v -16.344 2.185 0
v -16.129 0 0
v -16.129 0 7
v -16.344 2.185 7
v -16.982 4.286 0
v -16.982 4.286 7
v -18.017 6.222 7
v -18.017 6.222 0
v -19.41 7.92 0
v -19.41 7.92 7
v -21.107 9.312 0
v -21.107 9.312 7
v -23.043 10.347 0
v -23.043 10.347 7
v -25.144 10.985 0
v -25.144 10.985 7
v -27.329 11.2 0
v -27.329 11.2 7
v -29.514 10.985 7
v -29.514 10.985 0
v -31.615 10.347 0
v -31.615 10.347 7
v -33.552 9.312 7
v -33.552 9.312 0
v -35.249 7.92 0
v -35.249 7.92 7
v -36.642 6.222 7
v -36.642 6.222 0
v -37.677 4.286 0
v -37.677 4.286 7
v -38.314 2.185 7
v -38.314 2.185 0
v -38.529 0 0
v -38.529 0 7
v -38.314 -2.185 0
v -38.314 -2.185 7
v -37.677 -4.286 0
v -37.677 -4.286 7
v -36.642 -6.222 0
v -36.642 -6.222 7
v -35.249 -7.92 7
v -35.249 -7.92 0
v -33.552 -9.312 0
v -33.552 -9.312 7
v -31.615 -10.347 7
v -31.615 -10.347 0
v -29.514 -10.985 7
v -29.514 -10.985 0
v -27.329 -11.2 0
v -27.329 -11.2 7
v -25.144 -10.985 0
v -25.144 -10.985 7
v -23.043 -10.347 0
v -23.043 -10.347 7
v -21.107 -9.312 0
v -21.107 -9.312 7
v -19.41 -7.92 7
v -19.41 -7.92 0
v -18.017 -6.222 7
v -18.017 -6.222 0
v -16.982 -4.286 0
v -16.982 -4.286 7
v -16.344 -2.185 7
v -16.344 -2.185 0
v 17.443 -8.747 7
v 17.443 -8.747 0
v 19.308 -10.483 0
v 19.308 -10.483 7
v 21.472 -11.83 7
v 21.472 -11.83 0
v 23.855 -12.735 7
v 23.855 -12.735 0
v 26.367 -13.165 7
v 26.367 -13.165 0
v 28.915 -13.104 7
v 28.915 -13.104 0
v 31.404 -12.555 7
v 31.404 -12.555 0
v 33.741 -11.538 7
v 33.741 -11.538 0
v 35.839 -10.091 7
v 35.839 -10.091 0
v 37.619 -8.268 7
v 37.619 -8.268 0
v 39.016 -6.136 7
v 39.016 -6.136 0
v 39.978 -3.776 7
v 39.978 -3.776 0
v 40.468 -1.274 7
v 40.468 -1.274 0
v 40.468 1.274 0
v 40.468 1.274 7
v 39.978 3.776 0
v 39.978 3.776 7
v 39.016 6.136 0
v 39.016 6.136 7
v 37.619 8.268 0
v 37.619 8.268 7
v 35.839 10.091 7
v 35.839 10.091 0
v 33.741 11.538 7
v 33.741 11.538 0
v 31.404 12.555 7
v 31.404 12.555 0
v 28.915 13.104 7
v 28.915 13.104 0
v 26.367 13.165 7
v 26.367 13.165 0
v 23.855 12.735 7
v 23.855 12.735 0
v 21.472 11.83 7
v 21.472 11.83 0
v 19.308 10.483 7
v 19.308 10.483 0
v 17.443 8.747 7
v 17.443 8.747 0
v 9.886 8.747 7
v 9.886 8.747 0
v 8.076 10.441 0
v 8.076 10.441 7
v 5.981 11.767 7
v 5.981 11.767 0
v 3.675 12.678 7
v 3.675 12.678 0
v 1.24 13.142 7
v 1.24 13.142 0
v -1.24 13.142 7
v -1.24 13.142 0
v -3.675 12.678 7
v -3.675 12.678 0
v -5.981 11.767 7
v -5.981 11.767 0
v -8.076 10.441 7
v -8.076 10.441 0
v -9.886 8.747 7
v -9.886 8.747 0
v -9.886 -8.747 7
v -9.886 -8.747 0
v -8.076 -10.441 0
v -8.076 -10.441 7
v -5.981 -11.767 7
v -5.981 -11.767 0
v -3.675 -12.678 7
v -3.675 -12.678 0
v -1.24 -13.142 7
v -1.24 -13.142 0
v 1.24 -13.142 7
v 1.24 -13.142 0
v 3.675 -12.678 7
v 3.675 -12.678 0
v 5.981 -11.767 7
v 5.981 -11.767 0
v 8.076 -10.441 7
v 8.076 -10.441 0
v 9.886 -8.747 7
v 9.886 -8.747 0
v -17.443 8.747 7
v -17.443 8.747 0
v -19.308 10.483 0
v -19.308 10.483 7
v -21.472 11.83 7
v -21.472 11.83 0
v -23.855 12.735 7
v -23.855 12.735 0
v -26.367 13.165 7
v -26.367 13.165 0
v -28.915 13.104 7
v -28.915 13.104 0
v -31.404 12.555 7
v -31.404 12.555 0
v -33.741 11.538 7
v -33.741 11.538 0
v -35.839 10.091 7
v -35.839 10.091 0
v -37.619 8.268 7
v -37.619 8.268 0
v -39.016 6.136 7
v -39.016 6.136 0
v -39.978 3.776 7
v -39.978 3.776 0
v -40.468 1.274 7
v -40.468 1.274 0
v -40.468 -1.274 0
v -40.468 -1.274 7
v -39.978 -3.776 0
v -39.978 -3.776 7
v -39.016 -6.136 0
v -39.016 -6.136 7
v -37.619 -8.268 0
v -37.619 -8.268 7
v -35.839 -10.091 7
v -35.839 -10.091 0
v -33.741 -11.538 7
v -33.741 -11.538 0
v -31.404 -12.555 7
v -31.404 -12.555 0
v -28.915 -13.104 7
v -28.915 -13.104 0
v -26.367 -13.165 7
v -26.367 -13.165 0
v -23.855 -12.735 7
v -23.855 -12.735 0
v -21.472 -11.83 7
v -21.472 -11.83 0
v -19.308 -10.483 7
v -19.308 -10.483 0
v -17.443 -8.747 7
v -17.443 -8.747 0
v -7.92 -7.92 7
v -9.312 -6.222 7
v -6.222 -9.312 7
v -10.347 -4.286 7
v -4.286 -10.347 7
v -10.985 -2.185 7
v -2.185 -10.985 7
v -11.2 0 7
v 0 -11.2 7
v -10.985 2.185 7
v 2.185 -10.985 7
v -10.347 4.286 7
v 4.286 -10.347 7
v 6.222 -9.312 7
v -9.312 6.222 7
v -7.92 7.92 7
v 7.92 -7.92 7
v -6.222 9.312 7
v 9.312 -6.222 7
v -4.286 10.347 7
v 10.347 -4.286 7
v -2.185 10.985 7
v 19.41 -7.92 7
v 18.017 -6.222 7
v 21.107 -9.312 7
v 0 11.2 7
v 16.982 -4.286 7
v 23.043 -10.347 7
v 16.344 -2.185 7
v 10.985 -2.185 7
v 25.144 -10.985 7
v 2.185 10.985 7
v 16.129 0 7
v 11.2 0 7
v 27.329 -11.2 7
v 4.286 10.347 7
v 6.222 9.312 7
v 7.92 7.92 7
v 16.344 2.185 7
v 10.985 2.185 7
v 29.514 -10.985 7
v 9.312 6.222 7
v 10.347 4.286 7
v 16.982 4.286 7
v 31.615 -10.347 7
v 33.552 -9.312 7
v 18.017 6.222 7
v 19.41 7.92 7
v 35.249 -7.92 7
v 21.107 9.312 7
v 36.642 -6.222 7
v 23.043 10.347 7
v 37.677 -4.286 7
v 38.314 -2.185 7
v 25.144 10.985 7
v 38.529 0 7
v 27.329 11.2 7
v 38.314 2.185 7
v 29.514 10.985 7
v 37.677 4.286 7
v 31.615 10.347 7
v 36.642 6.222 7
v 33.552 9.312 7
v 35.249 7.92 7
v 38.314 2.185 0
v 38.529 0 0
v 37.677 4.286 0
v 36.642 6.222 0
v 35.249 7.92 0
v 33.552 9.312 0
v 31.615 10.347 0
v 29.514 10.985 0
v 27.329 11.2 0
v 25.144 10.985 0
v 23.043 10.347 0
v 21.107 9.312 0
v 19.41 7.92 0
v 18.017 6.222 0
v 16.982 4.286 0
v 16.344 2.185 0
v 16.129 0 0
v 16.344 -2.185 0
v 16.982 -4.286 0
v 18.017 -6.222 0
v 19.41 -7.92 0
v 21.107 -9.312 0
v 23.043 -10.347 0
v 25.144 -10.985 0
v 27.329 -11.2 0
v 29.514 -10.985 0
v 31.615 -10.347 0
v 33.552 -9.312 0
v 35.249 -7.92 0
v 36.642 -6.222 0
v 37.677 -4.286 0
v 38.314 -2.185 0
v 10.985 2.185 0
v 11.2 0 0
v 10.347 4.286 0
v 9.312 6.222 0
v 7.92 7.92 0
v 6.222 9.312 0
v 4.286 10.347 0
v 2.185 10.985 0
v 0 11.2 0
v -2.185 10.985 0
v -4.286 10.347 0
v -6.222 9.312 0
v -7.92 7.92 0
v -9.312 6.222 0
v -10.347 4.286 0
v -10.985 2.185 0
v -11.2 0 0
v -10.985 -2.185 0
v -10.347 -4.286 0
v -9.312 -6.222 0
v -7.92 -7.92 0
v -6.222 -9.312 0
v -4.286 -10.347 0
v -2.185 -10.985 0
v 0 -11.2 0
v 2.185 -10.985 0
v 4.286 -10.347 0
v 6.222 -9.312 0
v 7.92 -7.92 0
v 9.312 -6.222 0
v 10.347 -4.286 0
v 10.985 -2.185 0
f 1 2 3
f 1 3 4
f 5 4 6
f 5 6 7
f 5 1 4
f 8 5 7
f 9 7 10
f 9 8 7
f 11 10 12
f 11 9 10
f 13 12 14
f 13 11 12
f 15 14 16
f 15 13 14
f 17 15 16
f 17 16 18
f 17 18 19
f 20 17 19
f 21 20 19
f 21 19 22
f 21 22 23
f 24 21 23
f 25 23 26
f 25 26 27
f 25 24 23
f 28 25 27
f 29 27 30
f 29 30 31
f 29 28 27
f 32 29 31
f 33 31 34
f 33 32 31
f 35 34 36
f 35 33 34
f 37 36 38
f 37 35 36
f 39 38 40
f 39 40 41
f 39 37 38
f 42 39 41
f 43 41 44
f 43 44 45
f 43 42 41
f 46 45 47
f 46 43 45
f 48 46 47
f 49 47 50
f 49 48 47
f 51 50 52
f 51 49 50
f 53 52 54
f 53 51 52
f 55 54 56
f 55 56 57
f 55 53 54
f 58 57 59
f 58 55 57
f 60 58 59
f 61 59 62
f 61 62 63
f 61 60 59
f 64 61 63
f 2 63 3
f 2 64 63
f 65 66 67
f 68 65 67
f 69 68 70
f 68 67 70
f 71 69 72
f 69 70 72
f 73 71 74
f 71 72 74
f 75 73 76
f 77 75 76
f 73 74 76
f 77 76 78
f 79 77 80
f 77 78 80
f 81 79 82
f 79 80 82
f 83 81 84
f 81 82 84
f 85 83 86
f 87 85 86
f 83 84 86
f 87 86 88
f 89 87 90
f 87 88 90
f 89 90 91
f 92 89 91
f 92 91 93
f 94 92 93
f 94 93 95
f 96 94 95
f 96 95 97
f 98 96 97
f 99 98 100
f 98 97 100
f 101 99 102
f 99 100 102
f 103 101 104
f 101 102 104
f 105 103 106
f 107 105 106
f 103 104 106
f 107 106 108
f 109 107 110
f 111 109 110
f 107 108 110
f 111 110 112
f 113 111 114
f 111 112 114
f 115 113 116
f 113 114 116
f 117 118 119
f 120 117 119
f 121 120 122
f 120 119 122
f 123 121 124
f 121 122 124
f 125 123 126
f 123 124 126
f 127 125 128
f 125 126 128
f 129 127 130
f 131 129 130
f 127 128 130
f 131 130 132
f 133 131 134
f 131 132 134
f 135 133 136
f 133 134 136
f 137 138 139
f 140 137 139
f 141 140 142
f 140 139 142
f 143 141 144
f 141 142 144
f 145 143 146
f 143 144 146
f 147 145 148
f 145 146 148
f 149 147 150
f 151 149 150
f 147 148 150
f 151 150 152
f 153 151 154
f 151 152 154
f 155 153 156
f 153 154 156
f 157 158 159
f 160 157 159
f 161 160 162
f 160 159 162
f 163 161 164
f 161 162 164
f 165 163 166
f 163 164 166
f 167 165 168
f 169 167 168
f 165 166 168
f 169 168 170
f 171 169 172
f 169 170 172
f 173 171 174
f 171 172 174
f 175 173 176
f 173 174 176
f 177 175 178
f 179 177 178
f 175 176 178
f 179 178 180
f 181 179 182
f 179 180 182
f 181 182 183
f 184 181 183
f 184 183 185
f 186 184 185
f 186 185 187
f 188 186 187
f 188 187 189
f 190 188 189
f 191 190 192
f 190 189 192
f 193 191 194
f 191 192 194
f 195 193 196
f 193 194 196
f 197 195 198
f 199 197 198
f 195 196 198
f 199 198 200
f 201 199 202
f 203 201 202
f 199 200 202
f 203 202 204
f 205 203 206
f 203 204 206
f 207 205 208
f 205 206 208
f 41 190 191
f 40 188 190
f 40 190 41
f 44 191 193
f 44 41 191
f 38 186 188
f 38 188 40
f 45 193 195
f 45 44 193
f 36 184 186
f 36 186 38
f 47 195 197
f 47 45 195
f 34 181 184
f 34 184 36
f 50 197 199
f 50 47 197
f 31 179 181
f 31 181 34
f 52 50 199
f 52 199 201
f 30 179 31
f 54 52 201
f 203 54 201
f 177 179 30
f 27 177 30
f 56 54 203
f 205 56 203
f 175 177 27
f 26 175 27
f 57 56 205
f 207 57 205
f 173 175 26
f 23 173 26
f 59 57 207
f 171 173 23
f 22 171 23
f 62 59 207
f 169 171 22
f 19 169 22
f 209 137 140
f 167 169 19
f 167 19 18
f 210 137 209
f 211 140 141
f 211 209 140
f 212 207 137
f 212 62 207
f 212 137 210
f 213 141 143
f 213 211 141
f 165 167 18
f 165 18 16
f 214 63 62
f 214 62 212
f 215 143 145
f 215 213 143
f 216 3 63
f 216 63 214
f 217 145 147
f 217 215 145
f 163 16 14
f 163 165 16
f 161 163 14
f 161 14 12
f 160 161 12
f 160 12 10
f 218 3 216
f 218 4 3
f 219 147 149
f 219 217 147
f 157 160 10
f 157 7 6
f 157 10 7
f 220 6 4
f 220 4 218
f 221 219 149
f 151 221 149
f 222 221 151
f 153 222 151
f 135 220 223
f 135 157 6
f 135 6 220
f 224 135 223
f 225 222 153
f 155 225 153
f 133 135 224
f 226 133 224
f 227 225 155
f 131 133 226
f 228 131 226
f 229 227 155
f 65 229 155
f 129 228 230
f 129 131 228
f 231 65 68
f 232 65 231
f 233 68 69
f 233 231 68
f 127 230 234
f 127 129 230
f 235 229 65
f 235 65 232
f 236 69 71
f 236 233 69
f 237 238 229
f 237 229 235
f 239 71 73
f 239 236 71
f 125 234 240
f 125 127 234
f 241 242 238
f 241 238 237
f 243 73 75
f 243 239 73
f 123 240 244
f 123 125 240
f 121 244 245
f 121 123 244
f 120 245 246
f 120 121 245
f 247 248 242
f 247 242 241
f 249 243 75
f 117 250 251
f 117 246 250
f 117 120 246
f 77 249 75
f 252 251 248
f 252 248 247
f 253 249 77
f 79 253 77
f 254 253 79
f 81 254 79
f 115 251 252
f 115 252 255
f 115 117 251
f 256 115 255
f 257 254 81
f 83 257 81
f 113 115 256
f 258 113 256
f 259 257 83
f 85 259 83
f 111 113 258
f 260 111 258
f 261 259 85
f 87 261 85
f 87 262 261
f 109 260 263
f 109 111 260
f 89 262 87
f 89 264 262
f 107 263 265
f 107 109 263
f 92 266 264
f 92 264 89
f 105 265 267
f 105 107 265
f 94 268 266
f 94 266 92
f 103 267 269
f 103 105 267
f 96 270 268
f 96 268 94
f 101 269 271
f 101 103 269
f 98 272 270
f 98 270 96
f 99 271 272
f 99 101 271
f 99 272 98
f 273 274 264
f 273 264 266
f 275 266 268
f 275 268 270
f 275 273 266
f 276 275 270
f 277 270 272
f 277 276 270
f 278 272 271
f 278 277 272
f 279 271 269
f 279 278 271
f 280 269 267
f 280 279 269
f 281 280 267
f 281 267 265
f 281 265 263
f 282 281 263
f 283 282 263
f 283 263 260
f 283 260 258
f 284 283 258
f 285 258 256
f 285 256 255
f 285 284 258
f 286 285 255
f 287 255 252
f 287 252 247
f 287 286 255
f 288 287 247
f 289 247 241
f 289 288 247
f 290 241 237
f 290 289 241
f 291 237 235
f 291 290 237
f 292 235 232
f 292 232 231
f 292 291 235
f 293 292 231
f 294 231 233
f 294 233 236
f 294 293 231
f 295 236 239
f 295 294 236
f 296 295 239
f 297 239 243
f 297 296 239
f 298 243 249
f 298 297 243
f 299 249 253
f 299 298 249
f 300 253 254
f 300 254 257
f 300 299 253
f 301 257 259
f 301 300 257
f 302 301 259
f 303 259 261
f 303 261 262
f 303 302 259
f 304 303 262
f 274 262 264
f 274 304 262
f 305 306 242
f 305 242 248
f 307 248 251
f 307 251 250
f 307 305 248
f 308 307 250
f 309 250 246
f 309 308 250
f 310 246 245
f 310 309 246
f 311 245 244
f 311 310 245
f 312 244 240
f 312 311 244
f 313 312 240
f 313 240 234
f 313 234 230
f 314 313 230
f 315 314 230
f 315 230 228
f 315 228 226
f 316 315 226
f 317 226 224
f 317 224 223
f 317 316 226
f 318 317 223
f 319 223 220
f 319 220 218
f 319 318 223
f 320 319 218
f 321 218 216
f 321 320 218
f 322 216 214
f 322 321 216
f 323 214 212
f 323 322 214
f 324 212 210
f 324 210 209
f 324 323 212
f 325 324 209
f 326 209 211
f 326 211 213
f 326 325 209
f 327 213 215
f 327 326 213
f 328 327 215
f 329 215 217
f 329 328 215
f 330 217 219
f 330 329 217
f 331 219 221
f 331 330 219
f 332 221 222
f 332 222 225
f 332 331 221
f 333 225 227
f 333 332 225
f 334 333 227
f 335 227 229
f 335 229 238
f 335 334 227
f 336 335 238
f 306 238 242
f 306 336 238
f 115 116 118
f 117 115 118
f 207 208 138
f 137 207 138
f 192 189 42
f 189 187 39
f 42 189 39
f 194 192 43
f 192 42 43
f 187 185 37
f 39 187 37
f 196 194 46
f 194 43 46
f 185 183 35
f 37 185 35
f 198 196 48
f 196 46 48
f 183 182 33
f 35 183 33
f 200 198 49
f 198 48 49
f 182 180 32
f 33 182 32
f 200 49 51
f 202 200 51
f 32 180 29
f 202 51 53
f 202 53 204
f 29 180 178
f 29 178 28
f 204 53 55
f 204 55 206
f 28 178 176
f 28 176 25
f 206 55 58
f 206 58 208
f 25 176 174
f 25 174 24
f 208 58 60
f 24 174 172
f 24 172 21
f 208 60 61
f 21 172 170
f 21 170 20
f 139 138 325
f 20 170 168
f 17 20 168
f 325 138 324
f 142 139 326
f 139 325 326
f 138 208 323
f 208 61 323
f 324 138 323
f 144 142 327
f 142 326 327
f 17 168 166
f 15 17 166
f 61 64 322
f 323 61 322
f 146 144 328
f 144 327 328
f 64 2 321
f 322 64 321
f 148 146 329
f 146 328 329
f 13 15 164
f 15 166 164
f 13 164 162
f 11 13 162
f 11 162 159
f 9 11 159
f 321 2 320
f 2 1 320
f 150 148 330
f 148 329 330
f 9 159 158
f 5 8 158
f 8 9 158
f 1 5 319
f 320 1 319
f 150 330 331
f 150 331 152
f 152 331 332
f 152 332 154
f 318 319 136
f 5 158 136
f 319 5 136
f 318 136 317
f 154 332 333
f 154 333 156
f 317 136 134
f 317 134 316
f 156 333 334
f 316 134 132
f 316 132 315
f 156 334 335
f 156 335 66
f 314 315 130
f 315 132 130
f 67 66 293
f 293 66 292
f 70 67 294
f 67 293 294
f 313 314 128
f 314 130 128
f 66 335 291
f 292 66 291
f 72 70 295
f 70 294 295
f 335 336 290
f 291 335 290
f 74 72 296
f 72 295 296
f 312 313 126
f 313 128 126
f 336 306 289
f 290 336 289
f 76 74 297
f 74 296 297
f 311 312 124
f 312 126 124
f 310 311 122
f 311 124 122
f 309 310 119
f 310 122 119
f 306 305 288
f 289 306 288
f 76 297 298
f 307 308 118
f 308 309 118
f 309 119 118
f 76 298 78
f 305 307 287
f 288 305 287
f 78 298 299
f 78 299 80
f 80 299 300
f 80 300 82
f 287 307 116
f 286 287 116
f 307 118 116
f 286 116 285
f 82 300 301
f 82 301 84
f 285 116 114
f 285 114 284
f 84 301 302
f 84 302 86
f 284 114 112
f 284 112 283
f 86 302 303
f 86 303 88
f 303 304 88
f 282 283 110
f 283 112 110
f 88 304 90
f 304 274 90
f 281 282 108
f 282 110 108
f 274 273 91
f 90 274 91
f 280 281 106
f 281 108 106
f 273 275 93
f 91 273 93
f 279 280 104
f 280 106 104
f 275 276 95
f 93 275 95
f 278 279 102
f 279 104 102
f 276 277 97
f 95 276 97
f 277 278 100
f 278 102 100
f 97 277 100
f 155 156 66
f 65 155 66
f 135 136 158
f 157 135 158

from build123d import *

# Parameters (mm, degrees)
F0_R     = 11.2
F1_DEPTH = 7


with BuildPart() as f1:
    # F0 (on Top) → F1 (new body)
    with BuildSketch(Plane.XY):
        with BuildLine():
            ThreePointArc((-9.886205, -8.746596), (-13.2, 0), (-9.886205, 8.746596))
            Line((-9.886205, 8.746596), (-17.443001, 8.746596))
            ThreePointArc((-17.443001, 8.746596), (-40.529206, 0), (-17.443001, -8.746596))
            Line((-17.443001, -8.746596), (-9.886205, -8.746596))
        make_face()
        with Locations((-27.329206, 0)):
            Circle(F0_R, mode=Mode.SUBTRACT)
        with BuildLine():
            ThreePointArc((9.886205, 8.746596), (12.343782, 4.676649), (13.2, 0))
            ThreePointArc((13.2, 0), (12.343782, -4.676649), (9.886205, -8.746596))
            Line((9.886205, -8.746596), (17.443001, -8.746596))
            ThreePointArc((17.443001, -8.746596), (40.529206, 0), (17.443001, 8.746596))
            Line((17.443001, 8.746596), (9.886205, 8.746596))
        make_face()
        with Locations((27.329206, 0)):
            Circle(F0_R, mode=Mode.SUBTRACT)
        with BuildLine():
            ThreePointArc((9.886205, -8.746596), (12.343782, -4.676649), (13.2, 0))
            ThreePointArc((13.2, 0), (12.343782, 4.676649), (9.886205, 8.746596))
            ThreePointArc((9.886205, 8.746596), (0, 13.2), (-9.886205, 8.746596))
            ThreePointArc((-9.886205, 8.746596), (-13.2, 0), (-9.886205, -8.746596))
            ThreePointArc((-9.886205, -8.746596), (0, -13.2), (9.886205, -8.746596))
        make_face()
        Circle(F0_R, mode=Mode.SUBTRACT)
    extrude(amount=F1_DEPTH)


solid = f1.part
